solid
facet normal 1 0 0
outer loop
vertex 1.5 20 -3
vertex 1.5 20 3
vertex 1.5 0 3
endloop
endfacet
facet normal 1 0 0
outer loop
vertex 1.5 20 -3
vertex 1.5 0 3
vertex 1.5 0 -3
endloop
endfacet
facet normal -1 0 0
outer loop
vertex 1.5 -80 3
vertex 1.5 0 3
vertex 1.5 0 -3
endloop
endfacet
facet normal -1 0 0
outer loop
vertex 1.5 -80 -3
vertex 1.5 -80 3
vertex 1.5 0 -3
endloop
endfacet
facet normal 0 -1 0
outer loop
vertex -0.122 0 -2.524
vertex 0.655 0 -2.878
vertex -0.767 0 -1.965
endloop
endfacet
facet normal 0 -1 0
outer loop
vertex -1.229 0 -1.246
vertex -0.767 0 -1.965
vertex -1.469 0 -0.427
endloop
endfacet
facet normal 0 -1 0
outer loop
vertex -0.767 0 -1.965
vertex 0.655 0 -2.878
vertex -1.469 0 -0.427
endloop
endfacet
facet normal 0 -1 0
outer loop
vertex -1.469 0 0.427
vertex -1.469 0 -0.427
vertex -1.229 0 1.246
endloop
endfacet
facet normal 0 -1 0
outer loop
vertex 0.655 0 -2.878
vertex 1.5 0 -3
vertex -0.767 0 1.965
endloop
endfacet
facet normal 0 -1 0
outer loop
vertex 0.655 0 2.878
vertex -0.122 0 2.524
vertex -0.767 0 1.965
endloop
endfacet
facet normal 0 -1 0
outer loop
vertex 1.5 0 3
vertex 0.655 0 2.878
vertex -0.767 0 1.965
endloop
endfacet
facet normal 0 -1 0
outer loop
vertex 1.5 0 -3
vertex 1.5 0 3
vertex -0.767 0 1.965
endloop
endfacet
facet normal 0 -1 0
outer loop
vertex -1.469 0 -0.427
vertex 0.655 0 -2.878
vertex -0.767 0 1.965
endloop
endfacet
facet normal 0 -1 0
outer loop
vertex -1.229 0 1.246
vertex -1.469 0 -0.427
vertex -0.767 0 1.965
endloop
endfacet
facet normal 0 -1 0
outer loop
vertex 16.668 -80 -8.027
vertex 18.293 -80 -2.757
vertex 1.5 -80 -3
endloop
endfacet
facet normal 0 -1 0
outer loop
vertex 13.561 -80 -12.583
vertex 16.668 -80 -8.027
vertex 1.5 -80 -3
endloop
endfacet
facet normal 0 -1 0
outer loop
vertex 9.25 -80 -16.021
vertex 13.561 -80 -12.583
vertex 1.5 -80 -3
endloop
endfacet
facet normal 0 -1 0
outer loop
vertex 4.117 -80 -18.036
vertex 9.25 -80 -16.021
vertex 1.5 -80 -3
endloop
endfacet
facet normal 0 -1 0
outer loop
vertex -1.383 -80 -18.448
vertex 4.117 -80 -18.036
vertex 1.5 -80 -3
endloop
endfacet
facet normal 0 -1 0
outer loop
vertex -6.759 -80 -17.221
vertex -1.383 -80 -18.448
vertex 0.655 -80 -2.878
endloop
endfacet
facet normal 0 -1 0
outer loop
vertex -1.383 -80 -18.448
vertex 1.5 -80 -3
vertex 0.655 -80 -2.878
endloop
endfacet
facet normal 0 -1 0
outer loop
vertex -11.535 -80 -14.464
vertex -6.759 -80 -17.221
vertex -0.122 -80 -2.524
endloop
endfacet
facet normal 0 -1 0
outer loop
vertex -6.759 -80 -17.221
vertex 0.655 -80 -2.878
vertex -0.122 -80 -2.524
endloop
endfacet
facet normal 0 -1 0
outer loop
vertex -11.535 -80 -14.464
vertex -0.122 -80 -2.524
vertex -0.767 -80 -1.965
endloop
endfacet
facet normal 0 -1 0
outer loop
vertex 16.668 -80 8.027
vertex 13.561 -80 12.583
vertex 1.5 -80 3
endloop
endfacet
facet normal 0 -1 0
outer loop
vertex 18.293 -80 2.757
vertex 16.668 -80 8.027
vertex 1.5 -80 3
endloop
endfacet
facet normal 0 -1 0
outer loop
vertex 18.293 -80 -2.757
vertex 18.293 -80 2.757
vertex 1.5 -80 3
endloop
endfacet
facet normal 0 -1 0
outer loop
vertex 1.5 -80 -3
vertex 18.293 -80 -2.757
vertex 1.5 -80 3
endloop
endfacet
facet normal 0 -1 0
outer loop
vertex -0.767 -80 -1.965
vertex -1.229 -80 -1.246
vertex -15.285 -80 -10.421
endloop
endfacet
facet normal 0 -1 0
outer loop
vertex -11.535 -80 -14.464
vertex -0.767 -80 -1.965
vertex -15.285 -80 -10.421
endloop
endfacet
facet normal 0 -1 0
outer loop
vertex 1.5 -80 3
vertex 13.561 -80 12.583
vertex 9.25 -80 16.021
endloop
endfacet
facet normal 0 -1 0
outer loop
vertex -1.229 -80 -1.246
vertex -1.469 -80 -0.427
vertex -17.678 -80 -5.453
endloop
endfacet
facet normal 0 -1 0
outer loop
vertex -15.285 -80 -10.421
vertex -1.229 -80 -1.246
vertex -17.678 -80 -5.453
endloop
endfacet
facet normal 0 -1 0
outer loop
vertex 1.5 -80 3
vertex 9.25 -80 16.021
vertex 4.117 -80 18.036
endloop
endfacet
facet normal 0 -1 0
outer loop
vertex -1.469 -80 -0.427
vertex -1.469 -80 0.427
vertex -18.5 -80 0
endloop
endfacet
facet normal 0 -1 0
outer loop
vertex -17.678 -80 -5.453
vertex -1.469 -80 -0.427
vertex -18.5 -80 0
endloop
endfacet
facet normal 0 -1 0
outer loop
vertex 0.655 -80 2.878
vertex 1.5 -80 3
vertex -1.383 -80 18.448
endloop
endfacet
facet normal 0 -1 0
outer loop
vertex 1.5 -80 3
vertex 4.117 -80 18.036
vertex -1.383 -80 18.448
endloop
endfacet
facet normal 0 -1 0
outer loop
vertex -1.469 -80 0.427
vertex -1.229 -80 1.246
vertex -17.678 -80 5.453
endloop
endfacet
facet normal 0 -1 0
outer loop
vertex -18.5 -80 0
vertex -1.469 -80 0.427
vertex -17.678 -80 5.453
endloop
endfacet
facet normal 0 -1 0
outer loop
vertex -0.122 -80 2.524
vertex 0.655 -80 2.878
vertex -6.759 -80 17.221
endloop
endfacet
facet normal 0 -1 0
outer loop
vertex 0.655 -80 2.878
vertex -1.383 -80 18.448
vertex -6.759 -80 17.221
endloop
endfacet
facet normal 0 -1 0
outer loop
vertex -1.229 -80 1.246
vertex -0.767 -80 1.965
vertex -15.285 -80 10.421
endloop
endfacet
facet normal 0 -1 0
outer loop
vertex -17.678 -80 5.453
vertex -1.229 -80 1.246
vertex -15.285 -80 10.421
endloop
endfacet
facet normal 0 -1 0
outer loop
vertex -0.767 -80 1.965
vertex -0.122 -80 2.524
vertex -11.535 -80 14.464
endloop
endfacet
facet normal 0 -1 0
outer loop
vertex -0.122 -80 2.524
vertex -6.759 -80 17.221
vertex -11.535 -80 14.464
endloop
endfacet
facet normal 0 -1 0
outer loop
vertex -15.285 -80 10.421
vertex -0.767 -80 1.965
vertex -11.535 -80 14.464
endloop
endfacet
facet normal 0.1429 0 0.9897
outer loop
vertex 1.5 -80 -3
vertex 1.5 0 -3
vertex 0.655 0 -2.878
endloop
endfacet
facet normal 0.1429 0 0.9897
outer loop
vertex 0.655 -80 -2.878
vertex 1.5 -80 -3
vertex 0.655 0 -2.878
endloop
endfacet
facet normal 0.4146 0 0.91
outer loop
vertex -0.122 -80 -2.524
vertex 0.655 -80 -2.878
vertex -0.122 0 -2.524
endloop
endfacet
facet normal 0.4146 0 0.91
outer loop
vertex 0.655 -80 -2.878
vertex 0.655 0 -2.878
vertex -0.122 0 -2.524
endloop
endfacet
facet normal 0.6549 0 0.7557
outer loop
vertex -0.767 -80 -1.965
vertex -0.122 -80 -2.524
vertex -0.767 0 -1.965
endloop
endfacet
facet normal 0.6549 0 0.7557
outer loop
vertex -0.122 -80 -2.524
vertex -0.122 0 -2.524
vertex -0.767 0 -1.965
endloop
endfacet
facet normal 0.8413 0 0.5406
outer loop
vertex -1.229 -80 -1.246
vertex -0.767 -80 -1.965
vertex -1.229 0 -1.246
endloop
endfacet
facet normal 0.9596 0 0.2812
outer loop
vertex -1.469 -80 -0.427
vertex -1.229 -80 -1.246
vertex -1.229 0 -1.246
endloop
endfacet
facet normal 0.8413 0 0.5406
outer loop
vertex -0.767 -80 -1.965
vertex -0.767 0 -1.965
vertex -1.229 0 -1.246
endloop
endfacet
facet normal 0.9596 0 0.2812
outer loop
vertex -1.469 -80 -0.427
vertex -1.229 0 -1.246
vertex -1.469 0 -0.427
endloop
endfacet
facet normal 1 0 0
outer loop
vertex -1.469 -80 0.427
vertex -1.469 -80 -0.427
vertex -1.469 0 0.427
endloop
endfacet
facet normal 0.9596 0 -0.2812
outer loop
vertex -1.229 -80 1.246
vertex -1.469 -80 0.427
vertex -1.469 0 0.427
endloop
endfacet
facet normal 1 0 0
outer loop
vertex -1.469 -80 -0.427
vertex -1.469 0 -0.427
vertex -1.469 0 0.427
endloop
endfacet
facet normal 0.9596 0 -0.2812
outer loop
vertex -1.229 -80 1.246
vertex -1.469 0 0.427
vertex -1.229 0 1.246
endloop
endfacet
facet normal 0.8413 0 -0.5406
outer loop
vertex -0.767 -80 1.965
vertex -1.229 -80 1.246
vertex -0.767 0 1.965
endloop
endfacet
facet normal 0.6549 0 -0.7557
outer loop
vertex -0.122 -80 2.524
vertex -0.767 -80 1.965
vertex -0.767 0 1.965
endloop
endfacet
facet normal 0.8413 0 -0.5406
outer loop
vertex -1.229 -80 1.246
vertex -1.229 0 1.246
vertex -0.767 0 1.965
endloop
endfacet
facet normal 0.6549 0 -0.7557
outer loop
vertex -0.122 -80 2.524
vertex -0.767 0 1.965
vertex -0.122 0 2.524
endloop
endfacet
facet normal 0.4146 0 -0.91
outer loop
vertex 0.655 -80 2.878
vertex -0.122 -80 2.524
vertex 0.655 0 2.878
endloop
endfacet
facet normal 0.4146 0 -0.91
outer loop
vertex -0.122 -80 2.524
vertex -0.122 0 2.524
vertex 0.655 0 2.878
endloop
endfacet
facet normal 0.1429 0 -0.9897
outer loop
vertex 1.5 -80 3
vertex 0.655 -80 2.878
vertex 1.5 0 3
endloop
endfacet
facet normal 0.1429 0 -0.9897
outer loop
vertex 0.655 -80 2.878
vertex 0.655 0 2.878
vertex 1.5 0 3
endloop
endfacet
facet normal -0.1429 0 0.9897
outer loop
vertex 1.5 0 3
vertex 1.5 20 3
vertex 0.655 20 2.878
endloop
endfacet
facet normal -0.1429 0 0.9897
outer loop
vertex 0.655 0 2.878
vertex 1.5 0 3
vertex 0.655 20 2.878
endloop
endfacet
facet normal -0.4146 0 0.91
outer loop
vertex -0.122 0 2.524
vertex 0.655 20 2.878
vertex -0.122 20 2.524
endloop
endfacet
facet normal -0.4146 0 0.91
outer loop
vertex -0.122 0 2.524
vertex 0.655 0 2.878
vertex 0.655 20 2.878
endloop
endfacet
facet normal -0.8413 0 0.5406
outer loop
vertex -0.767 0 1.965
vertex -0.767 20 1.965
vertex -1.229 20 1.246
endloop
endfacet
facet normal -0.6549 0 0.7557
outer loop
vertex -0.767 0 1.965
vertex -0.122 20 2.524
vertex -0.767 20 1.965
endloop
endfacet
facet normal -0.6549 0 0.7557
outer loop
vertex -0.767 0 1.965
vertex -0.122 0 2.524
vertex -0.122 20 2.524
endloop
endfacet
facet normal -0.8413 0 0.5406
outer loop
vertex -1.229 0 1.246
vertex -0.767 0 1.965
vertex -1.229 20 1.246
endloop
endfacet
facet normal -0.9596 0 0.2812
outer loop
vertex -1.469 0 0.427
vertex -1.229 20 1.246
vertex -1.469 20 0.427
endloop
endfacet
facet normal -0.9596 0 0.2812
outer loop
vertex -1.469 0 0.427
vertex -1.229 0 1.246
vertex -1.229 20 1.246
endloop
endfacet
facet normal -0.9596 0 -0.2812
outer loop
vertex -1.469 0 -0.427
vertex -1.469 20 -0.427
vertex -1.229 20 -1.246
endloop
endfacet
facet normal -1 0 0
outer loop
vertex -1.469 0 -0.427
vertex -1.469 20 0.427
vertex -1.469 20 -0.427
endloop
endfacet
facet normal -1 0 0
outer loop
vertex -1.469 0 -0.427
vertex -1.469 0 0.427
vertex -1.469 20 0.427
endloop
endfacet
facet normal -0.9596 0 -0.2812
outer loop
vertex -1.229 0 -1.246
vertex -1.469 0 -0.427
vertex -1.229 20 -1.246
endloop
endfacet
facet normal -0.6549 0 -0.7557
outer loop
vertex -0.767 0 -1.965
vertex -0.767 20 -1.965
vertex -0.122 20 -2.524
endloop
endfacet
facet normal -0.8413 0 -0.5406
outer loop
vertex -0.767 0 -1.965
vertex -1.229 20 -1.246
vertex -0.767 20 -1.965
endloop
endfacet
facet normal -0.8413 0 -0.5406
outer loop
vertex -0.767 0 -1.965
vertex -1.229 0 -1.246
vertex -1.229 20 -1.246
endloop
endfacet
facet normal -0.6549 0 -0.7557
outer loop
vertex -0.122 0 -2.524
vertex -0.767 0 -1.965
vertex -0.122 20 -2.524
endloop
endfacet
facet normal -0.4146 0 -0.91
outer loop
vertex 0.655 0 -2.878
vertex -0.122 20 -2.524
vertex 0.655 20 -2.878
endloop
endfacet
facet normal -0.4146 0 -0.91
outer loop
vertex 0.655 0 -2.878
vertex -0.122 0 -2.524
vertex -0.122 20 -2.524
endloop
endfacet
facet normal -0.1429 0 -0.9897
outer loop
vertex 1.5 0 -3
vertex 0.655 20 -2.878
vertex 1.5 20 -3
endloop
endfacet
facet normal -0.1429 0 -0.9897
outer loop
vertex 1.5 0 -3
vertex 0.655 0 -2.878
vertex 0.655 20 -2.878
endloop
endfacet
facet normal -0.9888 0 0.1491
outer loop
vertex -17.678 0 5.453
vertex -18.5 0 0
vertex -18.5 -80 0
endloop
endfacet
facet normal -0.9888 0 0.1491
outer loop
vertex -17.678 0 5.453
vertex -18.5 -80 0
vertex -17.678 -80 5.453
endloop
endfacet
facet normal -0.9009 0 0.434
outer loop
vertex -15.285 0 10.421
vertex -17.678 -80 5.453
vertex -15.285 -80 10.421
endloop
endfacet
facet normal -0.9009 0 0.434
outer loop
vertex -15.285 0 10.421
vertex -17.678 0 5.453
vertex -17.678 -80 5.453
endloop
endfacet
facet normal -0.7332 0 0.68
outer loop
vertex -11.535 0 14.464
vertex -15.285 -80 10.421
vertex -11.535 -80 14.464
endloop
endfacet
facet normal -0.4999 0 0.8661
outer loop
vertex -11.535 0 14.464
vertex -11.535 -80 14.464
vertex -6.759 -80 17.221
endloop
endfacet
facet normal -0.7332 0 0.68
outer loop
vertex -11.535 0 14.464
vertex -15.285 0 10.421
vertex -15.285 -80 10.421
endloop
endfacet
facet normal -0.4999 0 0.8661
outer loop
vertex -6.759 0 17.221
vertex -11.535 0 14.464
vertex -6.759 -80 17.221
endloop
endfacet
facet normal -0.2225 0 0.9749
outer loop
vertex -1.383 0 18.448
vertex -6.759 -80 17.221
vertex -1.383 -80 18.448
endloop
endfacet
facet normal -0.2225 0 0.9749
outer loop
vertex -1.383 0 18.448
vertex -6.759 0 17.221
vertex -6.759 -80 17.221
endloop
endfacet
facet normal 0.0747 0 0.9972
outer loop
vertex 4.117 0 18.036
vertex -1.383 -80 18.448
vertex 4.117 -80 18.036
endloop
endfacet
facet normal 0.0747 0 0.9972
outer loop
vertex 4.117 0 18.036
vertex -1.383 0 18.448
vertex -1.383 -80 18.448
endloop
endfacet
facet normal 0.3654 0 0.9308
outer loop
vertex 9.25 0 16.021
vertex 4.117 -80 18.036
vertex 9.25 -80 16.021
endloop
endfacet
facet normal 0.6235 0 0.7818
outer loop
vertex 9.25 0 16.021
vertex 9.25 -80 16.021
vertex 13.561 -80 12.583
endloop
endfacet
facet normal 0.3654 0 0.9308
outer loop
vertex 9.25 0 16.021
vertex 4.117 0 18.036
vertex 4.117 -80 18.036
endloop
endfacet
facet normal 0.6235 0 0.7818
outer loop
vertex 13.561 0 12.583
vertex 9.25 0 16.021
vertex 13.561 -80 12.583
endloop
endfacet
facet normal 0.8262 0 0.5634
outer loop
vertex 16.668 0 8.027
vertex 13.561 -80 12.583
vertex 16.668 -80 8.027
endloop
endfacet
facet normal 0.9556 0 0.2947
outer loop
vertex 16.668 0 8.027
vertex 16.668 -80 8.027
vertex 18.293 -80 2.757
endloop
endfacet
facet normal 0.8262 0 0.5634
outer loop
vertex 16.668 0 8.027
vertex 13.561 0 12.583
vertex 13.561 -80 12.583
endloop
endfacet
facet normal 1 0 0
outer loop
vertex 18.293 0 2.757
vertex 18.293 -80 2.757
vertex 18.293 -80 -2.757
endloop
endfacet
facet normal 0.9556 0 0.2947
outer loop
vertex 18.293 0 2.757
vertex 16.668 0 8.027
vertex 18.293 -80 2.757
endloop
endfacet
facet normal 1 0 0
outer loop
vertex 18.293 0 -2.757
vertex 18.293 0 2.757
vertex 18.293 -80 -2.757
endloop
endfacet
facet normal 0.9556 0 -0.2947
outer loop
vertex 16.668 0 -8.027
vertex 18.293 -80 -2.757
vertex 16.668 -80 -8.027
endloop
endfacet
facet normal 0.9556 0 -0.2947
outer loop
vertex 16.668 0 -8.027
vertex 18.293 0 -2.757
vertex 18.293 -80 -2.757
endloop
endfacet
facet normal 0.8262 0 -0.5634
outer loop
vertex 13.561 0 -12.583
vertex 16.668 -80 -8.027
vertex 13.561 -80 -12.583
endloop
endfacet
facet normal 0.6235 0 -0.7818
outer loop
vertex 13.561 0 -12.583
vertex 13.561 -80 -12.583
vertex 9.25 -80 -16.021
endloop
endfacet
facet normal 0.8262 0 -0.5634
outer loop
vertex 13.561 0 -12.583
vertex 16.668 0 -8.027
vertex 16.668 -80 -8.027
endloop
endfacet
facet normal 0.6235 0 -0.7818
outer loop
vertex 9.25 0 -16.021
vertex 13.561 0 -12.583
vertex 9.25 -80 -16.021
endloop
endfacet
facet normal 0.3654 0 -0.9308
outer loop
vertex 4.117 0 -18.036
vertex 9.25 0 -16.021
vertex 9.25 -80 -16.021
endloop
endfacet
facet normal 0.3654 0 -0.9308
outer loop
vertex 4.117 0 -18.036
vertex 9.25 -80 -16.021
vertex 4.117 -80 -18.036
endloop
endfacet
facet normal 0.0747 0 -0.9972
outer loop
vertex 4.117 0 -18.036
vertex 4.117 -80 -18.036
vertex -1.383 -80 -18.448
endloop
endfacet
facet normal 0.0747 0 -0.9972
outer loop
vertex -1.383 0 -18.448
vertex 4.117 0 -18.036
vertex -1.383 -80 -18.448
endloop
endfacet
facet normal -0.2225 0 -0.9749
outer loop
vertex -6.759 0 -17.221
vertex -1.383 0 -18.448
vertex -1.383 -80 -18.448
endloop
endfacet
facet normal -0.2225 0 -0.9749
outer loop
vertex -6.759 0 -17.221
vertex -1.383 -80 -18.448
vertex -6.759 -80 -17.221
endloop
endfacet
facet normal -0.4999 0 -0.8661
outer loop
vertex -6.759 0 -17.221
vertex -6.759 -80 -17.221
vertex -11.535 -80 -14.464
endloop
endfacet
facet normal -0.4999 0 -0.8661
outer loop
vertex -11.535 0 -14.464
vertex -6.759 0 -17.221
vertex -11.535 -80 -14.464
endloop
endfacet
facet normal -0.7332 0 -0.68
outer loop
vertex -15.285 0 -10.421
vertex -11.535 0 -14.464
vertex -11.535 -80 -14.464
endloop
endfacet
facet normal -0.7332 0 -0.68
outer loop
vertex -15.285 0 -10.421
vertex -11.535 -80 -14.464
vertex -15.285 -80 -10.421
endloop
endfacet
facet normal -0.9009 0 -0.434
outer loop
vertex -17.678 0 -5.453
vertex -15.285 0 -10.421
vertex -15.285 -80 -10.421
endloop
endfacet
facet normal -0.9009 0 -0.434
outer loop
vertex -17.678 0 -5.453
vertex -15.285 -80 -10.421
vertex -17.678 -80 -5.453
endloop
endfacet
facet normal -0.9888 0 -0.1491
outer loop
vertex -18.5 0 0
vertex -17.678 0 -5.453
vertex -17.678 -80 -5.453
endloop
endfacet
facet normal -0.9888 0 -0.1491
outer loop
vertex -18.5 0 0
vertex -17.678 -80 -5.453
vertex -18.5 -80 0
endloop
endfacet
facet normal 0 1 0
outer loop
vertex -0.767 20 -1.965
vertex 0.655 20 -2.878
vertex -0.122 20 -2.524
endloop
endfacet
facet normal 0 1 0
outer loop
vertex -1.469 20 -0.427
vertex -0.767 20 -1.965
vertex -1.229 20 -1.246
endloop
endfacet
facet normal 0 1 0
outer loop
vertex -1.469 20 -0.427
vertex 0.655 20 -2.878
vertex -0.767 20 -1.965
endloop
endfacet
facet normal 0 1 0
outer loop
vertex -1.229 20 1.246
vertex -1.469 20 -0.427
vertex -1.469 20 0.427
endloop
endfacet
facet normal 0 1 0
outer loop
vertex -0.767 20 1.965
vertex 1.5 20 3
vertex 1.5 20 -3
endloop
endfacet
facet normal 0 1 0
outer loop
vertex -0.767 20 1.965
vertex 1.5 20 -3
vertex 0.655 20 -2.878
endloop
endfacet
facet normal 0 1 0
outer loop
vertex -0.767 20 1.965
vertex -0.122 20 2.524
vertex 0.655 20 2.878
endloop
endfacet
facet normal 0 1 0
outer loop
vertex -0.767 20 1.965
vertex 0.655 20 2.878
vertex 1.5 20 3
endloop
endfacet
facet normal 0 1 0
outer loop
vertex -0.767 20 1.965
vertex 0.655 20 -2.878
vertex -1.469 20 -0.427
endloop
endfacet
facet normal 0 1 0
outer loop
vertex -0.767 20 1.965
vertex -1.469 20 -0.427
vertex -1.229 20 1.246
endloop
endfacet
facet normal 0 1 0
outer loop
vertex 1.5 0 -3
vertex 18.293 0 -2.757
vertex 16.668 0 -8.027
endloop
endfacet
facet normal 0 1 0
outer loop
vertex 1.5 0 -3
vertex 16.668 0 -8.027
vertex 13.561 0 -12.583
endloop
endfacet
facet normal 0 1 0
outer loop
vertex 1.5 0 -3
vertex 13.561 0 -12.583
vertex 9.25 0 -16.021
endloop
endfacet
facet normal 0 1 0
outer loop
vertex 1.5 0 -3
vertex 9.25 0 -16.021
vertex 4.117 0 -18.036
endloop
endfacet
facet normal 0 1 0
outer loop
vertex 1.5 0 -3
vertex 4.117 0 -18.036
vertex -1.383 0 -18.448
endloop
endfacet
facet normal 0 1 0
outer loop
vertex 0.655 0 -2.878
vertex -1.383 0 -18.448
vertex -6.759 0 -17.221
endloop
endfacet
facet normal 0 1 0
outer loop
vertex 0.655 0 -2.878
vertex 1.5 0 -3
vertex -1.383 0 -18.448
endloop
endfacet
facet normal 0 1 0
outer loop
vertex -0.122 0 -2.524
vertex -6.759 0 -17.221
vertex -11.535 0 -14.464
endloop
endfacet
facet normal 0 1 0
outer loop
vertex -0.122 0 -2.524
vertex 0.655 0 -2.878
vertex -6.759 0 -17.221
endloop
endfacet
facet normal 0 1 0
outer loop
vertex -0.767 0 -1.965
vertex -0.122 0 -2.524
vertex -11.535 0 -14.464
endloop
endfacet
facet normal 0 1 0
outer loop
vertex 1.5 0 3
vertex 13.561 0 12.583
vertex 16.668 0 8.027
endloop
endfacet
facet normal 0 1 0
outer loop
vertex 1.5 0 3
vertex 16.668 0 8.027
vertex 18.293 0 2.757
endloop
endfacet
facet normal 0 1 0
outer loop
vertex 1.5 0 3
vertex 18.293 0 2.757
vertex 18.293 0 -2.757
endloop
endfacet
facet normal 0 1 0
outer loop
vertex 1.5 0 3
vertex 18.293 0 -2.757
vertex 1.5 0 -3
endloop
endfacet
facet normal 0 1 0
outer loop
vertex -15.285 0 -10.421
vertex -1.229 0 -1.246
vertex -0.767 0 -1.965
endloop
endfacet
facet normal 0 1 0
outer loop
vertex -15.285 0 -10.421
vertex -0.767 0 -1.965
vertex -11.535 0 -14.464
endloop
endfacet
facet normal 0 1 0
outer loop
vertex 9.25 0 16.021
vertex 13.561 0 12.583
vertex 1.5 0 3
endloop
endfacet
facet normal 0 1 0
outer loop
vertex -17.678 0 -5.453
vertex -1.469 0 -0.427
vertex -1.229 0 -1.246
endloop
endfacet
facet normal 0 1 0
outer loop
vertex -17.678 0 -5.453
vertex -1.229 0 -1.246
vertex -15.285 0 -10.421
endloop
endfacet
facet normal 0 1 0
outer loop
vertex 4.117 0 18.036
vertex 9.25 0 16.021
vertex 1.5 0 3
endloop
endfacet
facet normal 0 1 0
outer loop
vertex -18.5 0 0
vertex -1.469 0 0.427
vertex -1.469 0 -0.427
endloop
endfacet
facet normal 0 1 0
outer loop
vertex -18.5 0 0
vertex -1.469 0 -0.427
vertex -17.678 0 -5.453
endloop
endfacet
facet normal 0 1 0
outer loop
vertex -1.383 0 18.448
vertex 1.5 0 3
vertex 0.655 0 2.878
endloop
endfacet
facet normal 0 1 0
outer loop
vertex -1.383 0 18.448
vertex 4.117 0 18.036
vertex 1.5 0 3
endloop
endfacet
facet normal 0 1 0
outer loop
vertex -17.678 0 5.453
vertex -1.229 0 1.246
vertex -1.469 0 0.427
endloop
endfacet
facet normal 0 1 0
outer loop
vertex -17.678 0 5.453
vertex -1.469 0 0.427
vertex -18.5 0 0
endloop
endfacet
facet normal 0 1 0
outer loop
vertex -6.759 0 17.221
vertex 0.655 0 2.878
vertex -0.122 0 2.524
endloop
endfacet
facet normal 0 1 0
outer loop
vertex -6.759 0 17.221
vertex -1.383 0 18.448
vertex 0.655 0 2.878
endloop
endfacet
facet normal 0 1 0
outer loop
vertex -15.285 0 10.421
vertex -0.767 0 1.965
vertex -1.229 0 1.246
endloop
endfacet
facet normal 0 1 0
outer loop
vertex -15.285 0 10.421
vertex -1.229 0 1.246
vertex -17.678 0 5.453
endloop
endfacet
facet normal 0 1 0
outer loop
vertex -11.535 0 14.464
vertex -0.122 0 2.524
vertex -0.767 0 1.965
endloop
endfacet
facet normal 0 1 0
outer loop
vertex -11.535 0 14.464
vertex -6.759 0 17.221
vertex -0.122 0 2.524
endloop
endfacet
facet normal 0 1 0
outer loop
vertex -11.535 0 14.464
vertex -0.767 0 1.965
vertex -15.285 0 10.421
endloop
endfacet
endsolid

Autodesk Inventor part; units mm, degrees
ref_plane "YZ Plane" through (0, 0, 0) normal (1, 0, 0) x (0, 1, 0)
ref_plane "XZ Plane" through (0, 0, 0) normal (0, 1, 0) x (-1, 0, 0)
ref_plane "XY Plane" through (0, 0, 0) normal (0, 0, 1) x (1, 0, 0)
sketch "Sketch1" plane through (0, 0, 0) normal (0, 1, 0) x (-1, 0, 0)
  circle A0 centre (0, 0) radius 18.5
  arc A1 (-1.5, -3) -> (-1.5, 3) centre (-1.5, 0) ccw
  line L0 (-1.5, 0) -> (-1.5, -3) construction
  line L1 (-1.5, 0) -> (1.5, 0) construction
  line L2 (-1.5, 0) -> (-1.5, 3) construction
  line L3 (-1.5, 3) -> (-1.5, -3)
  dimension "d4" = 3
  dimension "d6" = 37
extrude "Extrusion1" add sketch "Sketch1" along normal blind 20 contours L3 A1
extrude "Extrusion2" add sketch "Sketch1" against normal blind 80
properties part number "motor"
